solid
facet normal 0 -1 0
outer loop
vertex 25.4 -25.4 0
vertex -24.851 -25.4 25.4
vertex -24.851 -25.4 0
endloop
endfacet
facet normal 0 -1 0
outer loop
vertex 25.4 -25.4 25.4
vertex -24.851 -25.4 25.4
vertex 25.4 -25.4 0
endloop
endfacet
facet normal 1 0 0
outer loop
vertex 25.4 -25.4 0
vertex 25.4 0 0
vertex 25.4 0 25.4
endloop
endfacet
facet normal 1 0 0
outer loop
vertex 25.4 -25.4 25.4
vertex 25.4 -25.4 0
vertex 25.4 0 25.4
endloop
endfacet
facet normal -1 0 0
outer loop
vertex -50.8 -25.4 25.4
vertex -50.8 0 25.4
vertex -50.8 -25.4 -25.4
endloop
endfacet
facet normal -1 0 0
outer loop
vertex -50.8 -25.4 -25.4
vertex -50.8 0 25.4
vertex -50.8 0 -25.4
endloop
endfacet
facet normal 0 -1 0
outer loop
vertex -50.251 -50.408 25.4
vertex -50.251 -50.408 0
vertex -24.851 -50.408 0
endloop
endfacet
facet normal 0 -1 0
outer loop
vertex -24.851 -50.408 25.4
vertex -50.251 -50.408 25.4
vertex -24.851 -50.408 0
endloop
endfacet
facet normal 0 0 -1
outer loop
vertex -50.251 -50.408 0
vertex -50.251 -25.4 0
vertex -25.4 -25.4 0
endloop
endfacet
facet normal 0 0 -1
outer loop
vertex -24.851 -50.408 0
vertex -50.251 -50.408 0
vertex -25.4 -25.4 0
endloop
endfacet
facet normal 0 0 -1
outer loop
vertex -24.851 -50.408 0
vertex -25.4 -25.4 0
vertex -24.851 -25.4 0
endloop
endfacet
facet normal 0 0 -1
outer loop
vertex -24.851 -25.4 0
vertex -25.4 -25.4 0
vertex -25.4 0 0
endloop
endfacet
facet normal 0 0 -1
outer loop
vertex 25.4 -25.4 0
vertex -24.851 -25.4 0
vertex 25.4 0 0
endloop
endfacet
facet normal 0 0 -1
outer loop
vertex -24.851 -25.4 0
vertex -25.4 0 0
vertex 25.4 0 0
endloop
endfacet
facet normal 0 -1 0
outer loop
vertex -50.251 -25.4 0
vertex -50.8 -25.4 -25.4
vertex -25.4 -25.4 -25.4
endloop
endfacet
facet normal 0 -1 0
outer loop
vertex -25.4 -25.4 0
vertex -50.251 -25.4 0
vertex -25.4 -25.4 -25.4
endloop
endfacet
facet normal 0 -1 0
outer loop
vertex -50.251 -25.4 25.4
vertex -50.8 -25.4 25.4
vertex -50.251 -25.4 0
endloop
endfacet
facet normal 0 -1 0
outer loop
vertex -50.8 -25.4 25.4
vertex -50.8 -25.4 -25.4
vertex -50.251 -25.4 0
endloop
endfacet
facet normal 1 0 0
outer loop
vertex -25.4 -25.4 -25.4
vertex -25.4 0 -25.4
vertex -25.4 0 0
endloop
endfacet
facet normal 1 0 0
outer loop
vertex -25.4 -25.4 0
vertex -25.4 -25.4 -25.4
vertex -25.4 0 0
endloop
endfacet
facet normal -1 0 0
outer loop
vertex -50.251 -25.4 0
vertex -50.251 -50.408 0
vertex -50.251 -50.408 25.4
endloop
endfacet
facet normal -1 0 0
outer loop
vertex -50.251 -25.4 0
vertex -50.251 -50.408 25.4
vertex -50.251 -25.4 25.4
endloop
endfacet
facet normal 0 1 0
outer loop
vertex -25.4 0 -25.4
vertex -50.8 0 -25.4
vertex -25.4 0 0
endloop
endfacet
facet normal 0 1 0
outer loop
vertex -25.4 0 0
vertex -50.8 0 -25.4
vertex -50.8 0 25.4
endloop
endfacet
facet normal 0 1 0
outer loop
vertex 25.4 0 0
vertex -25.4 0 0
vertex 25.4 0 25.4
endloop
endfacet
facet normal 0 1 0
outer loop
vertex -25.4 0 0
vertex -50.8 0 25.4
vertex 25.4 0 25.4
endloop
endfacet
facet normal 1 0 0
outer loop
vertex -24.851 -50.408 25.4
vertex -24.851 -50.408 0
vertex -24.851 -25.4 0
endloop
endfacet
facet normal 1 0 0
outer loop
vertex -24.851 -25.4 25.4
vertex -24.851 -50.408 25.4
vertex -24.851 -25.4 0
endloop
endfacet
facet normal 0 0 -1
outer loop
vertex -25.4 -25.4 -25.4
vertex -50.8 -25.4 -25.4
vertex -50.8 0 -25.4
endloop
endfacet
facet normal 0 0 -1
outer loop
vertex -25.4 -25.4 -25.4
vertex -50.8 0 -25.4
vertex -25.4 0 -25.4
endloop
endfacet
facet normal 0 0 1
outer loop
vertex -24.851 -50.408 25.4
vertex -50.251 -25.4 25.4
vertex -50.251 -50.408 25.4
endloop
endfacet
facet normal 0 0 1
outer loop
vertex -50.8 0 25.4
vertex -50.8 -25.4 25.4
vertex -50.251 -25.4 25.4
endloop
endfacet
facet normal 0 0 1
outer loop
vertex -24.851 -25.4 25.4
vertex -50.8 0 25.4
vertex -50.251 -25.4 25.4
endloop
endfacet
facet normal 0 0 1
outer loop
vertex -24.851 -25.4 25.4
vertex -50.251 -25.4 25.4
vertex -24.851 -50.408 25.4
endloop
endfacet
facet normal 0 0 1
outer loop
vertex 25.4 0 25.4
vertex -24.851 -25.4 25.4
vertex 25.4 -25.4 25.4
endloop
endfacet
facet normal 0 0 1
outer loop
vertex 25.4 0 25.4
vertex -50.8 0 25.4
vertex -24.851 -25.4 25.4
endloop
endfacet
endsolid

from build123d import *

# Parameters (mm, degrees)
F0_W     = 25.4
F0_H     = 25.4
F1_DEPTH = 25.4
F2_W     = 25.4
F2_H     = 25.4
F3_DEPTH = 25.4


with BuildPart() as f1:
    # F0 (on Front) → F1 (new body)
    with BuildSketch(Plane.XZ):
        with Locations((-38.1, 12.7)):
            Rectangle(F0_W, F0_H)
        with Locations((-38.1, -12.7)):
            Rectangle(F0_W, F0_H)
        with Locations((-12.7, 12.7)):
            Rectangle(F0_W, F0_H)
        with Locations((12.7, 12.7)):
            Rectangle(F0_W, F0_H)
    extrude(amount=F1_DEPTH)

    # F2 (on Top) → F3 (join)
    with BuildSketch(Plane.XY):
        with Locations((-37.550894, -37.707685)):
            Rectangle(F2_W, F2_H)
    extrude(amount=F3_DEPTH)


solid = f1.part
